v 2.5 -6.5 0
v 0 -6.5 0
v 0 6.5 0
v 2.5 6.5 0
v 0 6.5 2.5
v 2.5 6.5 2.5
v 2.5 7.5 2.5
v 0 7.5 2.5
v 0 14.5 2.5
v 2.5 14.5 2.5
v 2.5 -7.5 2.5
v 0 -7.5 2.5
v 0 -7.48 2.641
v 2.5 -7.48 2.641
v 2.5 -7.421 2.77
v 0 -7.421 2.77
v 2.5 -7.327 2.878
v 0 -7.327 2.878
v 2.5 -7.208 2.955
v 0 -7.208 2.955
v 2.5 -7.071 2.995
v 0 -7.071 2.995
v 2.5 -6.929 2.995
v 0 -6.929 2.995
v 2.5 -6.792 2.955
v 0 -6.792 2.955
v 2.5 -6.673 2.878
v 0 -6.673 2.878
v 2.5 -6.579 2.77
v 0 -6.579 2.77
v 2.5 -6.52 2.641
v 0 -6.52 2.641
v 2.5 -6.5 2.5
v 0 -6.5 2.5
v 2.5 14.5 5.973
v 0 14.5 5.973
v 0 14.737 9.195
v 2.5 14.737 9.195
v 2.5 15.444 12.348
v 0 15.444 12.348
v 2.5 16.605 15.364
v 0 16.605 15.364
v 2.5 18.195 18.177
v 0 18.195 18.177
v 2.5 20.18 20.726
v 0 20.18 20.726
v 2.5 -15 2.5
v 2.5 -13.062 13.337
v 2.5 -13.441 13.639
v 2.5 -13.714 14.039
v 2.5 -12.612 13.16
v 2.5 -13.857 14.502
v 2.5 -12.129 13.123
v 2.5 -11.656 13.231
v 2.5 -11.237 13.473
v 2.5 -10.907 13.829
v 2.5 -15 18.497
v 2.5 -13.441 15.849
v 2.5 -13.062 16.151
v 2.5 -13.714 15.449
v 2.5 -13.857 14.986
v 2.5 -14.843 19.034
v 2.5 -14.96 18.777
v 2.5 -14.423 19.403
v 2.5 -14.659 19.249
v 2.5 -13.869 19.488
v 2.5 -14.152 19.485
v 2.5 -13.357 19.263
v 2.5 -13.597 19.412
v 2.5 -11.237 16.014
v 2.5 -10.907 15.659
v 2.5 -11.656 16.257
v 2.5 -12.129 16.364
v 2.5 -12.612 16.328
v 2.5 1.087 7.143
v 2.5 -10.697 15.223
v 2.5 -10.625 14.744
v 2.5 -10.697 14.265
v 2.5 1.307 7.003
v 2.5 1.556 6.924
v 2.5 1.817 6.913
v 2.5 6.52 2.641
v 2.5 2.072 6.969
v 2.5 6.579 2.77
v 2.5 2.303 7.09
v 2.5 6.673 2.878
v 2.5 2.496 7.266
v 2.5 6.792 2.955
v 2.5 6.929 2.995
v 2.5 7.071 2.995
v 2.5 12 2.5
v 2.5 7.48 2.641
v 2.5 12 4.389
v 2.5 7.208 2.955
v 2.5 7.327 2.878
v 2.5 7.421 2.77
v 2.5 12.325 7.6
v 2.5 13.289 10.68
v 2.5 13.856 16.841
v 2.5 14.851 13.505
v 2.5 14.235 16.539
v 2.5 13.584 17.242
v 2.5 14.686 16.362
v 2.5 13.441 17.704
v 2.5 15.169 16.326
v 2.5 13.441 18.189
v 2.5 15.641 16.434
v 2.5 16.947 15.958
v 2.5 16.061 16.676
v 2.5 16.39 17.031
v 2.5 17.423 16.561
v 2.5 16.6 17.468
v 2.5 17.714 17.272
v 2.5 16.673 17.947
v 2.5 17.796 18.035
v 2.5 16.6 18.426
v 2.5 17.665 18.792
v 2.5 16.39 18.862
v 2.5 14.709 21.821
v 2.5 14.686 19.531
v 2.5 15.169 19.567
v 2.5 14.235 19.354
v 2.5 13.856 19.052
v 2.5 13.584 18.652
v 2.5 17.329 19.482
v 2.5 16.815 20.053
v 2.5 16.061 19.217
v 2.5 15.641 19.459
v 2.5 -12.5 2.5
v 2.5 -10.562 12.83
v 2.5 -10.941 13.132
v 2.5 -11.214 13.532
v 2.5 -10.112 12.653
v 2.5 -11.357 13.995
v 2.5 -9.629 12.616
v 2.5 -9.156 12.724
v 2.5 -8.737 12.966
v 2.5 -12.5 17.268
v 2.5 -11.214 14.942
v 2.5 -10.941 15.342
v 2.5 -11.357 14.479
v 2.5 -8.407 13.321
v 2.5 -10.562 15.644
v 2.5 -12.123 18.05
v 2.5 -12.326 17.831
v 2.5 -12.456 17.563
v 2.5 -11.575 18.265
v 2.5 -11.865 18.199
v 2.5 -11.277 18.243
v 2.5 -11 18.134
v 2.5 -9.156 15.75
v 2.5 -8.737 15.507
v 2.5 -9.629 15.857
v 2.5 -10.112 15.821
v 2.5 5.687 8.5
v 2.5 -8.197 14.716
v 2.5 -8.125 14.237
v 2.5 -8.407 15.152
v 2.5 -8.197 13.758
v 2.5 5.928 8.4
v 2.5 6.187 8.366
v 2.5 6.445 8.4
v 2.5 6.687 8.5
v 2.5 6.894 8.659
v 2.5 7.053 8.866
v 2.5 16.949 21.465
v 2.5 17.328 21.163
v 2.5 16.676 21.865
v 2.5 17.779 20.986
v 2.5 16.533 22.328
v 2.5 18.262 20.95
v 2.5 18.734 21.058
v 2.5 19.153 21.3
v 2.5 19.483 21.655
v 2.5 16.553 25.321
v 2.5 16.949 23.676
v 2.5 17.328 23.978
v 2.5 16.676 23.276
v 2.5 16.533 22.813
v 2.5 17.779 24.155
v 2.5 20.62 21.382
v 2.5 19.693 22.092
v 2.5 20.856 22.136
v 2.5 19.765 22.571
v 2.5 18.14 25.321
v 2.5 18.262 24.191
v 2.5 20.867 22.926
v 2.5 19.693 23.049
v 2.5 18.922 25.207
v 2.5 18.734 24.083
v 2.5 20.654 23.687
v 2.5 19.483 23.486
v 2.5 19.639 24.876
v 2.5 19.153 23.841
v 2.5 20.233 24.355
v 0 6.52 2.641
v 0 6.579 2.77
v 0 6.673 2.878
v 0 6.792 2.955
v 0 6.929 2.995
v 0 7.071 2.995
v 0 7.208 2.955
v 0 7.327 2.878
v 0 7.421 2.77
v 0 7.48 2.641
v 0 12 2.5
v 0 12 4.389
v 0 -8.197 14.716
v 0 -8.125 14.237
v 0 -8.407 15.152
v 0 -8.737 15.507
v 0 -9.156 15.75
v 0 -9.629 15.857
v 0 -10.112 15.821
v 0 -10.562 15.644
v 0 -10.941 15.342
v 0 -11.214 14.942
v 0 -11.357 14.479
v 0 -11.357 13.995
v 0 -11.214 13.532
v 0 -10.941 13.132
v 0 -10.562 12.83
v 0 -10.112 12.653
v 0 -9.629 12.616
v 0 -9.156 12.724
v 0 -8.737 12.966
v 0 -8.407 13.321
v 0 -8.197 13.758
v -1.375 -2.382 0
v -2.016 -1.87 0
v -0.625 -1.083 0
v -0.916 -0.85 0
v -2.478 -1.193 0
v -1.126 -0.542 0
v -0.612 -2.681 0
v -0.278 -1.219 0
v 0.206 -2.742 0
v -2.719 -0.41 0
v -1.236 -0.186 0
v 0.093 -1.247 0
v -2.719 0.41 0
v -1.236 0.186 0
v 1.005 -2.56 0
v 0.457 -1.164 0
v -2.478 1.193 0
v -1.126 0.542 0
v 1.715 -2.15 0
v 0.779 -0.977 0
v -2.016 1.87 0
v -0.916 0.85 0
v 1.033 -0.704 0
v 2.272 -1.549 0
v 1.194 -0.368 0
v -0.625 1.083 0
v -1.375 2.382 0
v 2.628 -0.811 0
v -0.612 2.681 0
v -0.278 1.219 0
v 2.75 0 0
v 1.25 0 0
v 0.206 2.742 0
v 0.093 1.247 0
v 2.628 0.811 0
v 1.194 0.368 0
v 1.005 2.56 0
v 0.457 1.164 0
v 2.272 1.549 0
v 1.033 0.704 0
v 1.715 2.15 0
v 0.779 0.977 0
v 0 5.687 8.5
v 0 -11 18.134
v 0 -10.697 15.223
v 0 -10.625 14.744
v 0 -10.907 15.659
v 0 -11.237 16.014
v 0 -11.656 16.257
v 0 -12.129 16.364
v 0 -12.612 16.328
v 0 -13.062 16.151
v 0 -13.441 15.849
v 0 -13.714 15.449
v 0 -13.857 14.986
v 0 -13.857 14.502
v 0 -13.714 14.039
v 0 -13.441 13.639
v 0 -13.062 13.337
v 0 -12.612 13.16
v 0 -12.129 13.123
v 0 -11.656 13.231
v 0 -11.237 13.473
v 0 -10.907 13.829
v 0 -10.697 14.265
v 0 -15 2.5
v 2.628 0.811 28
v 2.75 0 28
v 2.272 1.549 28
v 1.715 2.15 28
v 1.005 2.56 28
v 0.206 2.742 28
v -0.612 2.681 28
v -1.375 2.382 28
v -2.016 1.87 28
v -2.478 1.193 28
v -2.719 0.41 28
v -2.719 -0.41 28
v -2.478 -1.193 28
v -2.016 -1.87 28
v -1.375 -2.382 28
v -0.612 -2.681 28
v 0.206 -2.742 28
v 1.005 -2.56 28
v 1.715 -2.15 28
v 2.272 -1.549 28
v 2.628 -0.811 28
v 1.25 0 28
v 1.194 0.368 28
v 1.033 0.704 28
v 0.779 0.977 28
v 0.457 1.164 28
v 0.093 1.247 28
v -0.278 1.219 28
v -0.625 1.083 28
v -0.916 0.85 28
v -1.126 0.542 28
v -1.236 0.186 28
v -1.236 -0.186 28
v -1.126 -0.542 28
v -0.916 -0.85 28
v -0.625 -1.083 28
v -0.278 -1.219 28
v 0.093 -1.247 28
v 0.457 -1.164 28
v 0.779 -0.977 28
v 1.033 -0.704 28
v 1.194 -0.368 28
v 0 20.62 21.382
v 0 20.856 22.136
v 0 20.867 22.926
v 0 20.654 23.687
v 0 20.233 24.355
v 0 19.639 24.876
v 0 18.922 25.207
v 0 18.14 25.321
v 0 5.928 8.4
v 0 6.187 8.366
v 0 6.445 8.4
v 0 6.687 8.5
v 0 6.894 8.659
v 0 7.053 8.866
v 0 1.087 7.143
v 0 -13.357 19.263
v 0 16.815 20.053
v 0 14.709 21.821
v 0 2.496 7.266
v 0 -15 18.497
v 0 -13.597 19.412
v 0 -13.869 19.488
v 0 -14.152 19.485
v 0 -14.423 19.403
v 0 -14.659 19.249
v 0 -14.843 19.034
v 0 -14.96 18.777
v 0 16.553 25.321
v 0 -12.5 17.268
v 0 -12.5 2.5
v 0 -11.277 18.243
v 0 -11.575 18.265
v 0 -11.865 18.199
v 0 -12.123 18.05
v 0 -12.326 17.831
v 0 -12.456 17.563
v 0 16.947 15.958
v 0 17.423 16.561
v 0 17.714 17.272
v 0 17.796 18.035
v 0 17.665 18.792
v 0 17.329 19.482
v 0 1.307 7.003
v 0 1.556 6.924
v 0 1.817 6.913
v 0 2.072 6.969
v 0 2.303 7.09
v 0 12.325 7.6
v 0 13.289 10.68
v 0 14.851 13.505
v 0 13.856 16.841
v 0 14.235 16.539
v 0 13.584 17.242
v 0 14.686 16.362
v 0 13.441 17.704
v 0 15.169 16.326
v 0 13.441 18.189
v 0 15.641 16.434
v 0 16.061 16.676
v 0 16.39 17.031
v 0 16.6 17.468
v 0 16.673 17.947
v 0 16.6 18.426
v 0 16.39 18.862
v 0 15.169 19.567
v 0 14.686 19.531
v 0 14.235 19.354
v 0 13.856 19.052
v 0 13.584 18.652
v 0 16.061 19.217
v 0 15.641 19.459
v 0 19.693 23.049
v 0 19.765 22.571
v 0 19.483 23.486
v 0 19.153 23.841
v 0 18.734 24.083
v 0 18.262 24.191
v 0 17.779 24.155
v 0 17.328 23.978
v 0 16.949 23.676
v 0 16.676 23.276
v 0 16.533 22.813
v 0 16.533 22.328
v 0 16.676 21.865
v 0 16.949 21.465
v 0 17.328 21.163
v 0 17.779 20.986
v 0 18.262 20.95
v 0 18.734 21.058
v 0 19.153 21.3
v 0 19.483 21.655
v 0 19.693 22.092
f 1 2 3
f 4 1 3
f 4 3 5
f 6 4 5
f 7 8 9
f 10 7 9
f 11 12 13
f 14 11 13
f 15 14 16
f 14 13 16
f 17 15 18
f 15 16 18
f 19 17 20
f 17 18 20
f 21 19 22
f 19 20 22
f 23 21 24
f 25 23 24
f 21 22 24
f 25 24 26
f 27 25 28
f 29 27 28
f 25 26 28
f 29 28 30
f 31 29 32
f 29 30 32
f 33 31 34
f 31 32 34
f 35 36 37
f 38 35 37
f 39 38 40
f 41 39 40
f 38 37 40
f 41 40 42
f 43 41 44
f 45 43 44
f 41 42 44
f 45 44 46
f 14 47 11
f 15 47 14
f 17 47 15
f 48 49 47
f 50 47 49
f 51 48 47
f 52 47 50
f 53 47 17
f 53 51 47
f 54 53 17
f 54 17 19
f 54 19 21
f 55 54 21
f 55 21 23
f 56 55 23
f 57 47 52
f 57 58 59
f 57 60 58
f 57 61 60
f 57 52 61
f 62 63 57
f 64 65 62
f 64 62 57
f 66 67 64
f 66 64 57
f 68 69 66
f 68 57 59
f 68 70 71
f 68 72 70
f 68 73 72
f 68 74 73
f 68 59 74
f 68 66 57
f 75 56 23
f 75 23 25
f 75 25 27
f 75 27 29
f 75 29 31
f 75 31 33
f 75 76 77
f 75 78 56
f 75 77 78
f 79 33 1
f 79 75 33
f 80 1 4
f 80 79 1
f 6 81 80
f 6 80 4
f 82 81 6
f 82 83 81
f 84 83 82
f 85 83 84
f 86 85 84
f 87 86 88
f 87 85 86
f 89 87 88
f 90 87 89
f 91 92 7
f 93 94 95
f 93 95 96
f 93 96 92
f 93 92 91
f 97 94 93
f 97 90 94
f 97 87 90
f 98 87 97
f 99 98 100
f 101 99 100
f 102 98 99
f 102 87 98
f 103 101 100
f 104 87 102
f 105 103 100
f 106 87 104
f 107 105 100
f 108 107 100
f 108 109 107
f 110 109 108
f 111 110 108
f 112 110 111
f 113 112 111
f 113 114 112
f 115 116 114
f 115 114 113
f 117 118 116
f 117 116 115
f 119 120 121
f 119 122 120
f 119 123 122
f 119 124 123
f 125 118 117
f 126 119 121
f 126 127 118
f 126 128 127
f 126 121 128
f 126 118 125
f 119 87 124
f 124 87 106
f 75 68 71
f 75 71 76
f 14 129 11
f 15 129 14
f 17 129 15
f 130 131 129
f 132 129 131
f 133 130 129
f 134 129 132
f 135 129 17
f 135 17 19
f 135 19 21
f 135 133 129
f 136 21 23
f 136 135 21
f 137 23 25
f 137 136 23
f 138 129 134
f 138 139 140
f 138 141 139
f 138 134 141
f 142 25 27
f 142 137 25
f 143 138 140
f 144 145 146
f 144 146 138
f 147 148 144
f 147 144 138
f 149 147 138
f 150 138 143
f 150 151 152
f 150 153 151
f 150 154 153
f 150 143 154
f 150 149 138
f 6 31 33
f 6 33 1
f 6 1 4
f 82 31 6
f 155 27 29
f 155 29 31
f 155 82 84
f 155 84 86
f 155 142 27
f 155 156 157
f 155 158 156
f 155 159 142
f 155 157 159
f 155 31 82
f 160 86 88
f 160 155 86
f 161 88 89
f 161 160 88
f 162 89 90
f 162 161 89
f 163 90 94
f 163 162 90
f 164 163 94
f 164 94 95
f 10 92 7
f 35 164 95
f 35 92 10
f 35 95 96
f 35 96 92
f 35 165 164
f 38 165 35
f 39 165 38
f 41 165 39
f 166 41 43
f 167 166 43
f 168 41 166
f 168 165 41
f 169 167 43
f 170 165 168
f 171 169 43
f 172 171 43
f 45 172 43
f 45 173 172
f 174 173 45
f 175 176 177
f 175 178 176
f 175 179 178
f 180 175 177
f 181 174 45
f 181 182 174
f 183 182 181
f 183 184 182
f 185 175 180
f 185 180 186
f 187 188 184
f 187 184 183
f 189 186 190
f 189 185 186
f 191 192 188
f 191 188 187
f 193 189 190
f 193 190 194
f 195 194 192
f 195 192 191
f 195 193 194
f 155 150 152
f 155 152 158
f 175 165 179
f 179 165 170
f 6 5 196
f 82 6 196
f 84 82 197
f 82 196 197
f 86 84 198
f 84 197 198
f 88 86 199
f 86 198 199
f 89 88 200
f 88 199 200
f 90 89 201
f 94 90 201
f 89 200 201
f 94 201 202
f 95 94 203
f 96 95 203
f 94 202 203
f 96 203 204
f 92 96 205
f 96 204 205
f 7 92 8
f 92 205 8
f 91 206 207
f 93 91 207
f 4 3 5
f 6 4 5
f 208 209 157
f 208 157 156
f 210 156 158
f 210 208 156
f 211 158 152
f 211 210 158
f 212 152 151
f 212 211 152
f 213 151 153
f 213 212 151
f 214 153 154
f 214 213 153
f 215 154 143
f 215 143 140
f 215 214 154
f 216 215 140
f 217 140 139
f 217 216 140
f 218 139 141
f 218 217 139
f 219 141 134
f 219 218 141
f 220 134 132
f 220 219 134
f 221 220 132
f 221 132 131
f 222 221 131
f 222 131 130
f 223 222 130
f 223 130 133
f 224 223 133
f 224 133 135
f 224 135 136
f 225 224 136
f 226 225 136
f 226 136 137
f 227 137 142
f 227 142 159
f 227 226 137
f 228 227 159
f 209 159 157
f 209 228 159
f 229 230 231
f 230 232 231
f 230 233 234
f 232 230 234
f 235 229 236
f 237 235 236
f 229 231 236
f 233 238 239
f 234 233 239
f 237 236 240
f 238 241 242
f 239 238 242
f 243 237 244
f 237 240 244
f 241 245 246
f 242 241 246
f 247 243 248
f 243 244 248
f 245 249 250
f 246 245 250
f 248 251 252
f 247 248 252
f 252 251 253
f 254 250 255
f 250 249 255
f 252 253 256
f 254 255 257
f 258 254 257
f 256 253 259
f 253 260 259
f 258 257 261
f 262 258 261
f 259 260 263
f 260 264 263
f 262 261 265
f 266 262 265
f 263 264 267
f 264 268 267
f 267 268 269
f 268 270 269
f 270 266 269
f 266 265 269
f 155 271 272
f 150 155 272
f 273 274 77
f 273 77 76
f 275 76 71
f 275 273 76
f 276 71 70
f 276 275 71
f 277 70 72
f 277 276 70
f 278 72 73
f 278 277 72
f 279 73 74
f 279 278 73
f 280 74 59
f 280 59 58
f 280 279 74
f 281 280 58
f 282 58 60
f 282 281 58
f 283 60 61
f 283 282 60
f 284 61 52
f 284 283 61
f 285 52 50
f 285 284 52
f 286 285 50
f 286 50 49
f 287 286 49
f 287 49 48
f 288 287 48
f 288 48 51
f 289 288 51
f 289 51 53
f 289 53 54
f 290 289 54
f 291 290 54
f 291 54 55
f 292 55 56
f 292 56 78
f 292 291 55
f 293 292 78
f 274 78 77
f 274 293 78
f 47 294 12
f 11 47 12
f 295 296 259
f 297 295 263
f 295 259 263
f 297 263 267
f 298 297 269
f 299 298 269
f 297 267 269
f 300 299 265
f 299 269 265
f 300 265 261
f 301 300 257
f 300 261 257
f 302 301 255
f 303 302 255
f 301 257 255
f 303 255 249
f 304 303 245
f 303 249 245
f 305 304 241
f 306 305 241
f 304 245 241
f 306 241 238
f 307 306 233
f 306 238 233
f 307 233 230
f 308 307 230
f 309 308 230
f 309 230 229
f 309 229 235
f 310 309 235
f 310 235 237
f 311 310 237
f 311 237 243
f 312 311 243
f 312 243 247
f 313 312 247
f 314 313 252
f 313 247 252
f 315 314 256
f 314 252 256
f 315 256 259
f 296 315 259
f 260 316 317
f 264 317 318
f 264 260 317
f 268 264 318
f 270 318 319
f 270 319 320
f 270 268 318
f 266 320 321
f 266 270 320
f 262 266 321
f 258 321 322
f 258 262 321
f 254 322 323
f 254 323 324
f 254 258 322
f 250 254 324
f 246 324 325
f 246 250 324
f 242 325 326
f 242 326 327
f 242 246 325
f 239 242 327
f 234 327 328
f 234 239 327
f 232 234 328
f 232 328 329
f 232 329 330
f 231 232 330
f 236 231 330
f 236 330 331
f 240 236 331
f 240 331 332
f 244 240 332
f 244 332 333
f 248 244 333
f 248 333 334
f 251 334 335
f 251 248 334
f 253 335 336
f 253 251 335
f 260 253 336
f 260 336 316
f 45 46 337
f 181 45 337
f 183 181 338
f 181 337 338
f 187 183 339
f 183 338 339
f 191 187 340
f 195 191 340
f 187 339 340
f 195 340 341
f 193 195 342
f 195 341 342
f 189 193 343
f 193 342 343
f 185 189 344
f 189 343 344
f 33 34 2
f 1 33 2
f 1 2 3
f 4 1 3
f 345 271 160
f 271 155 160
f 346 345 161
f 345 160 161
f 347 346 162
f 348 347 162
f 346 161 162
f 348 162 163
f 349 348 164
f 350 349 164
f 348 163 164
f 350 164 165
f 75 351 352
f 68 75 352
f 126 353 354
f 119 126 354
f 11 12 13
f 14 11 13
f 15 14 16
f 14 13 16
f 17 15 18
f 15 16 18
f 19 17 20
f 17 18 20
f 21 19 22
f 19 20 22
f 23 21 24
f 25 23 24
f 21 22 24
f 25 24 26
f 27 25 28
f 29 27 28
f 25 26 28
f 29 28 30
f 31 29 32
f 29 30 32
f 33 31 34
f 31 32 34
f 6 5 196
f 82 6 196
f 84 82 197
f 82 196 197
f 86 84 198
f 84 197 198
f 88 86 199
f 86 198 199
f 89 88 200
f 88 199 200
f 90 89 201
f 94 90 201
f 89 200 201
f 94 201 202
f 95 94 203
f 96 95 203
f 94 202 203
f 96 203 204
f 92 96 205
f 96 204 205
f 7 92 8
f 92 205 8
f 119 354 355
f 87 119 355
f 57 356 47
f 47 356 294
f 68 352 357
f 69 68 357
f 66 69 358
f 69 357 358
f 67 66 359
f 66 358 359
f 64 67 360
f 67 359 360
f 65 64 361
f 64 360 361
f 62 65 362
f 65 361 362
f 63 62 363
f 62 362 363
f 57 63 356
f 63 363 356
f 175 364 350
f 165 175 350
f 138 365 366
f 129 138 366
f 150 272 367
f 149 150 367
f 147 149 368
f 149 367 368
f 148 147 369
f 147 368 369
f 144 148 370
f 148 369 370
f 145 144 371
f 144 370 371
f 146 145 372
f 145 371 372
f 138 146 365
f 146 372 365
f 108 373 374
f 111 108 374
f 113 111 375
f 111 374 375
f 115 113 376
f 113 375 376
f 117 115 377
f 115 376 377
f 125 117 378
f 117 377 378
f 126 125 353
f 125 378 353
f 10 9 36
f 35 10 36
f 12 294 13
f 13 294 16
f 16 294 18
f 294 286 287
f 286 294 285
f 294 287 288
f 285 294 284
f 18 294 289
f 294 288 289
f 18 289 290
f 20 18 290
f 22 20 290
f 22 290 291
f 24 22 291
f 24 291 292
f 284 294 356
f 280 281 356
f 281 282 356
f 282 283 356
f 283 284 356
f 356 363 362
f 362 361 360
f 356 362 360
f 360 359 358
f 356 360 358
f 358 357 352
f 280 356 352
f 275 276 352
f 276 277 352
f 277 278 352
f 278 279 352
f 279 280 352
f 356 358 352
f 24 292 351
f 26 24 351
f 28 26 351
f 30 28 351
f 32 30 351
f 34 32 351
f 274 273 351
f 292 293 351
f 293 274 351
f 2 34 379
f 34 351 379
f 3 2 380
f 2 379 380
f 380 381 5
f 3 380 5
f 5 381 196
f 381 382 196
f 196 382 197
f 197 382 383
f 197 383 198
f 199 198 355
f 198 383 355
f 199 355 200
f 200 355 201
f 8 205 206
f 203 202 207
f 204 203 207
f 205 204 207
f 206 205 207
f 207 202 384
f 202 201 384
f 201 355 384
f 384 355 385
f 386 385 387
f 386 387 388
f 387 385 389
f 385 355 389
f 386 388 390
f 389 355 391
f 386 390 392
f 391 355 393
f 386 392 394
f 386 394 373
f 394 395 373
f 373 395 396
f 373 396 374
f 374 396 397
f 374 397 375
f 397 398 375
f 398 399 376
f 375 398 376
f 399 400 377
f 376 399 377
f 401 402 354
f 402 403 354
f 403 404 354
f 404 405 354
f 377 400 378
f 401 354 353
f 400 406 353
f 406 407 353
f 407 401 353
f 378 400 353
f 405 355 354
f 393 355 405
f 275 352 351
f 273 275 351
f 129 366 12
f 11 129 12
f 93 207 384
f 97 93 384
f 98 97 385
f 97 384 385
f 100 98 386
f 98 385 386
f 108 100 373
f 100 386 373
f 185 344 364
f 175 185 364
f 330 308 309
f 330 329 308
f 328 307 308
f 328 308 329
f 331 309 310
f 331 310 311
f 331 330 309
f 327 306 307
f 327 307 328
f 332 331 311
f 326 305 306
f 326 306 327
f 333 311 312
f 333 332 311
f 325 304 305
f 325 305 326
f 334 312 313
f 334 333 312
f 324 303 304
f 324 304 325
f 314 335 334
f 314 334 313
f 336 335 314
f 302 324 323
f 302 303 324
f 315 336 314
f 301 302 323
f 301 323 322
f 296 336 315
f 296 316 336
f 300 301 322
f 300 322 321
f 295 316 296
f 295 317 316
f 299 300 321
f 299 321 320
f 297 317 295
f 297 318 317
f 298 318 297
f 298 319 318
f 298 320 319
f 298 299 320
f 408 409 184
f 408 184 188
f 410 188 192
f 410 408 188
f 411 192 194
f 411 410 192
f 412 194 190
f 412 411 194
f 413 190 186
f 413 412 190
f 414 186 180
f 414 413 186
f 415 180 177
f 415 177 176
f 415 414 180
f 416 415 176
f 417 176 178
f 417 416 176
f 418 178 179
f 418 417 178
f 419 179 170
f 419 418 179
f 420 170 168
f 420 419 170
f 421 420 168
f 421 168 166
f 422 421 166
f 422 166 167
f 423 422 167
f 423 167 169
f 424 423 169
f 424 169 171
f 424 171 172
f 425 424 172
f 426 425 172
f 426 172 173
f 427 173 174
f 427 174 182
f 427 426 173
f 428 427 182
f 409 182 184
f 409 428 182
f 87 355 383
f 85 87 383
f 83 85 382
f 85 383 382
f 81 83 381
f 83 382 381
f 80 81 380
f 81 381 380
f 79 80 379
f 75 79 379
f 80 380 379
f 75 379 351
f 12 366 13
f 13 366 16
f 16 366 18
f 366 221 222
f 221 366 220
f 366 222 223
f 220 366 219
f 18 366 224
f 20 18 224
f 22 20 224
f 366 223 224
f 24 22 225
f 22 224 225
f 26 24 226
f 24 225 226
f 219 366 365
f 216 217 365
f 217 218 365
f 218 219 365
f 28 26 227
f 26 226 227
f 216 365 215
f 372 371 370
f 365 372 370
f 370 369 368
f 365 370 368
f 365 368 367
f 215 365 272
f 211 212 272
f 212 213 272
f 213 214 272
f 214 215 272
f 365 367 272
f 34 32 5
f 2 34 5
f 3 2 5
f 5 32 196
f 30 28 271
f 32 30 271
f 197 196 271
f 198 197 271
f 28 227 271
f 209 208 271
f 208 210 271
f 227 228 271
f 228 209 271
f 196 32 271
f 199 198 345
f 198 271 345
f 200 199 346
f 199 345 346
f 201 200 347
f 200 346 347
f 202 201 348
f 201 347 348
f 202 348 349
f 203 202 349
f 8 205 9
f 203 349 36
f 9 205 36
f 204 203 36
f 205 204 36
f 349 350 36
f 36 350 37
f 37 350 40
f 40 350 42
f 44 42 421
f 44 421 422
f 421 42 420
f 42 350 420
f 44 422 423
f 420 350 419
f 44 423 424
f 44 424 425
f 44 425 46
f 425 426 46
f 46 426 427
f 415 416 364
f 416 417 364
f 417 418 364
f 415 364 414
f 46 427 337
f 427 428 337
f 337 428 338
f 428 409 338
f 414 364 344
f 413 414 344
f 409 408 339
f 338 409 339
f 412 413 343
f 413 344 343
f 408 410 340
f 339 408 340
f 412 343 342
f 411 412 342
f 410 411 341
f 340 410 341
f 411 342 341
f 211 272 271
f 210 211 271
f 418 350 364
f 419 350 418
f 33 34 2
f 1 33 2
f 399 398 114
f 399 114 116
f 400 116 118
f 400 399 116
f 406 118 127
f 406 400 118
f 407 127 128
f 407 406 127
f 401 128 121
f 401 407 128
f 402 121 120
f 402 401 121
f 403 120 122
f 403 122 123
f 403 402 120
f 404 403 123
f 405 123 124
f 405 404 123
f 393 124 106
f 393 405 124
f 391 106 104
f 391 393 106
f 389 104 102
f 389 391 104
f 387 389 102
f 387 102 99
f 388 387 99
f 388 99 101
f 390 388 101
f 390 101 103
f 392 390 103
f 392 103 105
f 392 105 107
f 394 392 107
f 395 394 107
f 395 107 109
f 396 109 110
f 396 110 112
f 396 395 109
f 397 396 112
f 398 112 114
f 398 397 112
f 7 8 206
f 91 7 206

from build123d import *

# Parameters (mm, degrees)
F0_R     = 1.625
F1_DEPTH = 2.5
F2_R     = 1
F3_R     = 1.625
F4_DEPTH = 2.5
F5_R     = 2.75
F5_R_2   = 1.25
F6_DEPTH = 28


with BuildPart() as f1:
    # F0 (on Right) → F1 (new body)
    with BuildSketch(Plane.YZ):
        with BuildLine():
            Line((-12.5, 17.267949), (-12.5, 2.5))
            Line((-12.5, 2.5), (-7.5, 2.5))
            ThreePointArc((-7.5, 2.5), (-7, 3), (-6.5, 2.5))
            Line((-6.5, 2.5), (-6.5, 0))
            Line((-6.5, 0), (6.5, 0))
            Line((6.5, 0), (6.5, 2.5))
            ThreePointArc((6.5, 2.5), (7, 3), (7.5, 2.5))
            Line((7.5, 2.5), (14.5, 2.5))
            Line((14.5, 2.5), (14.5, 5.972831))
            ThreePointArc((14.5, 5.972831), (15.969113, 13.877428), (20.180242, 20.726322))
            ThreePointArc((20.180242, 20.726322), (20.653638, 23.686525), (18.140272, 25.320508))
            Line((18.140272, 25.320508), (16.552559, 25.320508))
            Line((16.552559, 25.320508), (6.552559, 8))
            Line((6.552559, 8), (-11, 18.133975))
            ThreePointArc((-11, 18.133975), (-12, 18.133975), (-12.5, 17.267949))
        make_face()
        with Locations((-9.75, 14.23686)):
            Circle(F0_R, mode=Mode.SUBTRACT)
        with Locations((18.140272, 22.570508)):
            Circle(F0_R, mode=Mode.SUBTRACT)
    extrude(amount=F1_DEPTH)

    # F2
    f2_edges = [f1.edges().sort_by_distance(p)[0] for p in [
        (1.25, 6.552559, 8),
    ]]
    fillet(f2_edges, radius=F2_R)


with BuildPart() as f4:
    # F3 (on Right) → F4 (new body)
    with BuildSketch(Plane.YZ):
        with BuildLine():
            Line((-6.5, 2.5), (-6.5, 0))
            Line((-6.5, 0), (6.5, 0))
            Line((6.5, 0), (6.5, 2.5))
            ThreePointArc((6.5, 2.5), (7, 3), (7.5, 2.5))
            Line((7.5, 2.5), (12, 2.5))
            Line((12, 2.5), (12, 4.389312))
            ThreePointArc((12, 4.389312), (13.288741, 10.680486), (16.947359, 15.958198))
            ThreePointArc((16.947359, 15.958198), (17.796259, 18.035203), (16.815352, 20.053223))
            Line((16.815352, 20.053223), (14.70873, 21.820889))
            Line((14.70873, 21.820889), (2.495765, 7.266044))
            ThreePointArc((2.495765, 7.266044), (1.816877, 6.912637), (1.086933, 7.142788))
            Line((1.086933, 7.142788), (-13.357212, 19.262865))
            ThreePointArc((-13.357212, 19.262865), (-14.422618, 19.403128), (-15, 18.49682))
            Line((-15, 18.49682), (-15, 2.5))
            Line((-15, 2.5), (-7.5, 2.5))
            ThreePointArc((-7.5, 2.5), (-7, 3), (-6.5, 2.5))
        make_face()
        with Locations((-12.25, 14.743933)):
            Circle(F3_R, mode=Mode.SUBTRACT)
        with Locations((15.047686, 17.946601)):
            Circle(F3_R, mode=Mode.SUBTRACT)
    extrude(amount=F4_DEPTH)


with BuildPart() as f6:
    # F5 (on Top) → F6 (new body)
    with BuildSketch(Plane.XY):
        Circle(F5_R)
        Circle(F5_R_2, mode=Mode.SUBTRACT)
    extrude(amount=F6_DEPTH)


solid = Compound([f1.part, f4.part, f6.part])
